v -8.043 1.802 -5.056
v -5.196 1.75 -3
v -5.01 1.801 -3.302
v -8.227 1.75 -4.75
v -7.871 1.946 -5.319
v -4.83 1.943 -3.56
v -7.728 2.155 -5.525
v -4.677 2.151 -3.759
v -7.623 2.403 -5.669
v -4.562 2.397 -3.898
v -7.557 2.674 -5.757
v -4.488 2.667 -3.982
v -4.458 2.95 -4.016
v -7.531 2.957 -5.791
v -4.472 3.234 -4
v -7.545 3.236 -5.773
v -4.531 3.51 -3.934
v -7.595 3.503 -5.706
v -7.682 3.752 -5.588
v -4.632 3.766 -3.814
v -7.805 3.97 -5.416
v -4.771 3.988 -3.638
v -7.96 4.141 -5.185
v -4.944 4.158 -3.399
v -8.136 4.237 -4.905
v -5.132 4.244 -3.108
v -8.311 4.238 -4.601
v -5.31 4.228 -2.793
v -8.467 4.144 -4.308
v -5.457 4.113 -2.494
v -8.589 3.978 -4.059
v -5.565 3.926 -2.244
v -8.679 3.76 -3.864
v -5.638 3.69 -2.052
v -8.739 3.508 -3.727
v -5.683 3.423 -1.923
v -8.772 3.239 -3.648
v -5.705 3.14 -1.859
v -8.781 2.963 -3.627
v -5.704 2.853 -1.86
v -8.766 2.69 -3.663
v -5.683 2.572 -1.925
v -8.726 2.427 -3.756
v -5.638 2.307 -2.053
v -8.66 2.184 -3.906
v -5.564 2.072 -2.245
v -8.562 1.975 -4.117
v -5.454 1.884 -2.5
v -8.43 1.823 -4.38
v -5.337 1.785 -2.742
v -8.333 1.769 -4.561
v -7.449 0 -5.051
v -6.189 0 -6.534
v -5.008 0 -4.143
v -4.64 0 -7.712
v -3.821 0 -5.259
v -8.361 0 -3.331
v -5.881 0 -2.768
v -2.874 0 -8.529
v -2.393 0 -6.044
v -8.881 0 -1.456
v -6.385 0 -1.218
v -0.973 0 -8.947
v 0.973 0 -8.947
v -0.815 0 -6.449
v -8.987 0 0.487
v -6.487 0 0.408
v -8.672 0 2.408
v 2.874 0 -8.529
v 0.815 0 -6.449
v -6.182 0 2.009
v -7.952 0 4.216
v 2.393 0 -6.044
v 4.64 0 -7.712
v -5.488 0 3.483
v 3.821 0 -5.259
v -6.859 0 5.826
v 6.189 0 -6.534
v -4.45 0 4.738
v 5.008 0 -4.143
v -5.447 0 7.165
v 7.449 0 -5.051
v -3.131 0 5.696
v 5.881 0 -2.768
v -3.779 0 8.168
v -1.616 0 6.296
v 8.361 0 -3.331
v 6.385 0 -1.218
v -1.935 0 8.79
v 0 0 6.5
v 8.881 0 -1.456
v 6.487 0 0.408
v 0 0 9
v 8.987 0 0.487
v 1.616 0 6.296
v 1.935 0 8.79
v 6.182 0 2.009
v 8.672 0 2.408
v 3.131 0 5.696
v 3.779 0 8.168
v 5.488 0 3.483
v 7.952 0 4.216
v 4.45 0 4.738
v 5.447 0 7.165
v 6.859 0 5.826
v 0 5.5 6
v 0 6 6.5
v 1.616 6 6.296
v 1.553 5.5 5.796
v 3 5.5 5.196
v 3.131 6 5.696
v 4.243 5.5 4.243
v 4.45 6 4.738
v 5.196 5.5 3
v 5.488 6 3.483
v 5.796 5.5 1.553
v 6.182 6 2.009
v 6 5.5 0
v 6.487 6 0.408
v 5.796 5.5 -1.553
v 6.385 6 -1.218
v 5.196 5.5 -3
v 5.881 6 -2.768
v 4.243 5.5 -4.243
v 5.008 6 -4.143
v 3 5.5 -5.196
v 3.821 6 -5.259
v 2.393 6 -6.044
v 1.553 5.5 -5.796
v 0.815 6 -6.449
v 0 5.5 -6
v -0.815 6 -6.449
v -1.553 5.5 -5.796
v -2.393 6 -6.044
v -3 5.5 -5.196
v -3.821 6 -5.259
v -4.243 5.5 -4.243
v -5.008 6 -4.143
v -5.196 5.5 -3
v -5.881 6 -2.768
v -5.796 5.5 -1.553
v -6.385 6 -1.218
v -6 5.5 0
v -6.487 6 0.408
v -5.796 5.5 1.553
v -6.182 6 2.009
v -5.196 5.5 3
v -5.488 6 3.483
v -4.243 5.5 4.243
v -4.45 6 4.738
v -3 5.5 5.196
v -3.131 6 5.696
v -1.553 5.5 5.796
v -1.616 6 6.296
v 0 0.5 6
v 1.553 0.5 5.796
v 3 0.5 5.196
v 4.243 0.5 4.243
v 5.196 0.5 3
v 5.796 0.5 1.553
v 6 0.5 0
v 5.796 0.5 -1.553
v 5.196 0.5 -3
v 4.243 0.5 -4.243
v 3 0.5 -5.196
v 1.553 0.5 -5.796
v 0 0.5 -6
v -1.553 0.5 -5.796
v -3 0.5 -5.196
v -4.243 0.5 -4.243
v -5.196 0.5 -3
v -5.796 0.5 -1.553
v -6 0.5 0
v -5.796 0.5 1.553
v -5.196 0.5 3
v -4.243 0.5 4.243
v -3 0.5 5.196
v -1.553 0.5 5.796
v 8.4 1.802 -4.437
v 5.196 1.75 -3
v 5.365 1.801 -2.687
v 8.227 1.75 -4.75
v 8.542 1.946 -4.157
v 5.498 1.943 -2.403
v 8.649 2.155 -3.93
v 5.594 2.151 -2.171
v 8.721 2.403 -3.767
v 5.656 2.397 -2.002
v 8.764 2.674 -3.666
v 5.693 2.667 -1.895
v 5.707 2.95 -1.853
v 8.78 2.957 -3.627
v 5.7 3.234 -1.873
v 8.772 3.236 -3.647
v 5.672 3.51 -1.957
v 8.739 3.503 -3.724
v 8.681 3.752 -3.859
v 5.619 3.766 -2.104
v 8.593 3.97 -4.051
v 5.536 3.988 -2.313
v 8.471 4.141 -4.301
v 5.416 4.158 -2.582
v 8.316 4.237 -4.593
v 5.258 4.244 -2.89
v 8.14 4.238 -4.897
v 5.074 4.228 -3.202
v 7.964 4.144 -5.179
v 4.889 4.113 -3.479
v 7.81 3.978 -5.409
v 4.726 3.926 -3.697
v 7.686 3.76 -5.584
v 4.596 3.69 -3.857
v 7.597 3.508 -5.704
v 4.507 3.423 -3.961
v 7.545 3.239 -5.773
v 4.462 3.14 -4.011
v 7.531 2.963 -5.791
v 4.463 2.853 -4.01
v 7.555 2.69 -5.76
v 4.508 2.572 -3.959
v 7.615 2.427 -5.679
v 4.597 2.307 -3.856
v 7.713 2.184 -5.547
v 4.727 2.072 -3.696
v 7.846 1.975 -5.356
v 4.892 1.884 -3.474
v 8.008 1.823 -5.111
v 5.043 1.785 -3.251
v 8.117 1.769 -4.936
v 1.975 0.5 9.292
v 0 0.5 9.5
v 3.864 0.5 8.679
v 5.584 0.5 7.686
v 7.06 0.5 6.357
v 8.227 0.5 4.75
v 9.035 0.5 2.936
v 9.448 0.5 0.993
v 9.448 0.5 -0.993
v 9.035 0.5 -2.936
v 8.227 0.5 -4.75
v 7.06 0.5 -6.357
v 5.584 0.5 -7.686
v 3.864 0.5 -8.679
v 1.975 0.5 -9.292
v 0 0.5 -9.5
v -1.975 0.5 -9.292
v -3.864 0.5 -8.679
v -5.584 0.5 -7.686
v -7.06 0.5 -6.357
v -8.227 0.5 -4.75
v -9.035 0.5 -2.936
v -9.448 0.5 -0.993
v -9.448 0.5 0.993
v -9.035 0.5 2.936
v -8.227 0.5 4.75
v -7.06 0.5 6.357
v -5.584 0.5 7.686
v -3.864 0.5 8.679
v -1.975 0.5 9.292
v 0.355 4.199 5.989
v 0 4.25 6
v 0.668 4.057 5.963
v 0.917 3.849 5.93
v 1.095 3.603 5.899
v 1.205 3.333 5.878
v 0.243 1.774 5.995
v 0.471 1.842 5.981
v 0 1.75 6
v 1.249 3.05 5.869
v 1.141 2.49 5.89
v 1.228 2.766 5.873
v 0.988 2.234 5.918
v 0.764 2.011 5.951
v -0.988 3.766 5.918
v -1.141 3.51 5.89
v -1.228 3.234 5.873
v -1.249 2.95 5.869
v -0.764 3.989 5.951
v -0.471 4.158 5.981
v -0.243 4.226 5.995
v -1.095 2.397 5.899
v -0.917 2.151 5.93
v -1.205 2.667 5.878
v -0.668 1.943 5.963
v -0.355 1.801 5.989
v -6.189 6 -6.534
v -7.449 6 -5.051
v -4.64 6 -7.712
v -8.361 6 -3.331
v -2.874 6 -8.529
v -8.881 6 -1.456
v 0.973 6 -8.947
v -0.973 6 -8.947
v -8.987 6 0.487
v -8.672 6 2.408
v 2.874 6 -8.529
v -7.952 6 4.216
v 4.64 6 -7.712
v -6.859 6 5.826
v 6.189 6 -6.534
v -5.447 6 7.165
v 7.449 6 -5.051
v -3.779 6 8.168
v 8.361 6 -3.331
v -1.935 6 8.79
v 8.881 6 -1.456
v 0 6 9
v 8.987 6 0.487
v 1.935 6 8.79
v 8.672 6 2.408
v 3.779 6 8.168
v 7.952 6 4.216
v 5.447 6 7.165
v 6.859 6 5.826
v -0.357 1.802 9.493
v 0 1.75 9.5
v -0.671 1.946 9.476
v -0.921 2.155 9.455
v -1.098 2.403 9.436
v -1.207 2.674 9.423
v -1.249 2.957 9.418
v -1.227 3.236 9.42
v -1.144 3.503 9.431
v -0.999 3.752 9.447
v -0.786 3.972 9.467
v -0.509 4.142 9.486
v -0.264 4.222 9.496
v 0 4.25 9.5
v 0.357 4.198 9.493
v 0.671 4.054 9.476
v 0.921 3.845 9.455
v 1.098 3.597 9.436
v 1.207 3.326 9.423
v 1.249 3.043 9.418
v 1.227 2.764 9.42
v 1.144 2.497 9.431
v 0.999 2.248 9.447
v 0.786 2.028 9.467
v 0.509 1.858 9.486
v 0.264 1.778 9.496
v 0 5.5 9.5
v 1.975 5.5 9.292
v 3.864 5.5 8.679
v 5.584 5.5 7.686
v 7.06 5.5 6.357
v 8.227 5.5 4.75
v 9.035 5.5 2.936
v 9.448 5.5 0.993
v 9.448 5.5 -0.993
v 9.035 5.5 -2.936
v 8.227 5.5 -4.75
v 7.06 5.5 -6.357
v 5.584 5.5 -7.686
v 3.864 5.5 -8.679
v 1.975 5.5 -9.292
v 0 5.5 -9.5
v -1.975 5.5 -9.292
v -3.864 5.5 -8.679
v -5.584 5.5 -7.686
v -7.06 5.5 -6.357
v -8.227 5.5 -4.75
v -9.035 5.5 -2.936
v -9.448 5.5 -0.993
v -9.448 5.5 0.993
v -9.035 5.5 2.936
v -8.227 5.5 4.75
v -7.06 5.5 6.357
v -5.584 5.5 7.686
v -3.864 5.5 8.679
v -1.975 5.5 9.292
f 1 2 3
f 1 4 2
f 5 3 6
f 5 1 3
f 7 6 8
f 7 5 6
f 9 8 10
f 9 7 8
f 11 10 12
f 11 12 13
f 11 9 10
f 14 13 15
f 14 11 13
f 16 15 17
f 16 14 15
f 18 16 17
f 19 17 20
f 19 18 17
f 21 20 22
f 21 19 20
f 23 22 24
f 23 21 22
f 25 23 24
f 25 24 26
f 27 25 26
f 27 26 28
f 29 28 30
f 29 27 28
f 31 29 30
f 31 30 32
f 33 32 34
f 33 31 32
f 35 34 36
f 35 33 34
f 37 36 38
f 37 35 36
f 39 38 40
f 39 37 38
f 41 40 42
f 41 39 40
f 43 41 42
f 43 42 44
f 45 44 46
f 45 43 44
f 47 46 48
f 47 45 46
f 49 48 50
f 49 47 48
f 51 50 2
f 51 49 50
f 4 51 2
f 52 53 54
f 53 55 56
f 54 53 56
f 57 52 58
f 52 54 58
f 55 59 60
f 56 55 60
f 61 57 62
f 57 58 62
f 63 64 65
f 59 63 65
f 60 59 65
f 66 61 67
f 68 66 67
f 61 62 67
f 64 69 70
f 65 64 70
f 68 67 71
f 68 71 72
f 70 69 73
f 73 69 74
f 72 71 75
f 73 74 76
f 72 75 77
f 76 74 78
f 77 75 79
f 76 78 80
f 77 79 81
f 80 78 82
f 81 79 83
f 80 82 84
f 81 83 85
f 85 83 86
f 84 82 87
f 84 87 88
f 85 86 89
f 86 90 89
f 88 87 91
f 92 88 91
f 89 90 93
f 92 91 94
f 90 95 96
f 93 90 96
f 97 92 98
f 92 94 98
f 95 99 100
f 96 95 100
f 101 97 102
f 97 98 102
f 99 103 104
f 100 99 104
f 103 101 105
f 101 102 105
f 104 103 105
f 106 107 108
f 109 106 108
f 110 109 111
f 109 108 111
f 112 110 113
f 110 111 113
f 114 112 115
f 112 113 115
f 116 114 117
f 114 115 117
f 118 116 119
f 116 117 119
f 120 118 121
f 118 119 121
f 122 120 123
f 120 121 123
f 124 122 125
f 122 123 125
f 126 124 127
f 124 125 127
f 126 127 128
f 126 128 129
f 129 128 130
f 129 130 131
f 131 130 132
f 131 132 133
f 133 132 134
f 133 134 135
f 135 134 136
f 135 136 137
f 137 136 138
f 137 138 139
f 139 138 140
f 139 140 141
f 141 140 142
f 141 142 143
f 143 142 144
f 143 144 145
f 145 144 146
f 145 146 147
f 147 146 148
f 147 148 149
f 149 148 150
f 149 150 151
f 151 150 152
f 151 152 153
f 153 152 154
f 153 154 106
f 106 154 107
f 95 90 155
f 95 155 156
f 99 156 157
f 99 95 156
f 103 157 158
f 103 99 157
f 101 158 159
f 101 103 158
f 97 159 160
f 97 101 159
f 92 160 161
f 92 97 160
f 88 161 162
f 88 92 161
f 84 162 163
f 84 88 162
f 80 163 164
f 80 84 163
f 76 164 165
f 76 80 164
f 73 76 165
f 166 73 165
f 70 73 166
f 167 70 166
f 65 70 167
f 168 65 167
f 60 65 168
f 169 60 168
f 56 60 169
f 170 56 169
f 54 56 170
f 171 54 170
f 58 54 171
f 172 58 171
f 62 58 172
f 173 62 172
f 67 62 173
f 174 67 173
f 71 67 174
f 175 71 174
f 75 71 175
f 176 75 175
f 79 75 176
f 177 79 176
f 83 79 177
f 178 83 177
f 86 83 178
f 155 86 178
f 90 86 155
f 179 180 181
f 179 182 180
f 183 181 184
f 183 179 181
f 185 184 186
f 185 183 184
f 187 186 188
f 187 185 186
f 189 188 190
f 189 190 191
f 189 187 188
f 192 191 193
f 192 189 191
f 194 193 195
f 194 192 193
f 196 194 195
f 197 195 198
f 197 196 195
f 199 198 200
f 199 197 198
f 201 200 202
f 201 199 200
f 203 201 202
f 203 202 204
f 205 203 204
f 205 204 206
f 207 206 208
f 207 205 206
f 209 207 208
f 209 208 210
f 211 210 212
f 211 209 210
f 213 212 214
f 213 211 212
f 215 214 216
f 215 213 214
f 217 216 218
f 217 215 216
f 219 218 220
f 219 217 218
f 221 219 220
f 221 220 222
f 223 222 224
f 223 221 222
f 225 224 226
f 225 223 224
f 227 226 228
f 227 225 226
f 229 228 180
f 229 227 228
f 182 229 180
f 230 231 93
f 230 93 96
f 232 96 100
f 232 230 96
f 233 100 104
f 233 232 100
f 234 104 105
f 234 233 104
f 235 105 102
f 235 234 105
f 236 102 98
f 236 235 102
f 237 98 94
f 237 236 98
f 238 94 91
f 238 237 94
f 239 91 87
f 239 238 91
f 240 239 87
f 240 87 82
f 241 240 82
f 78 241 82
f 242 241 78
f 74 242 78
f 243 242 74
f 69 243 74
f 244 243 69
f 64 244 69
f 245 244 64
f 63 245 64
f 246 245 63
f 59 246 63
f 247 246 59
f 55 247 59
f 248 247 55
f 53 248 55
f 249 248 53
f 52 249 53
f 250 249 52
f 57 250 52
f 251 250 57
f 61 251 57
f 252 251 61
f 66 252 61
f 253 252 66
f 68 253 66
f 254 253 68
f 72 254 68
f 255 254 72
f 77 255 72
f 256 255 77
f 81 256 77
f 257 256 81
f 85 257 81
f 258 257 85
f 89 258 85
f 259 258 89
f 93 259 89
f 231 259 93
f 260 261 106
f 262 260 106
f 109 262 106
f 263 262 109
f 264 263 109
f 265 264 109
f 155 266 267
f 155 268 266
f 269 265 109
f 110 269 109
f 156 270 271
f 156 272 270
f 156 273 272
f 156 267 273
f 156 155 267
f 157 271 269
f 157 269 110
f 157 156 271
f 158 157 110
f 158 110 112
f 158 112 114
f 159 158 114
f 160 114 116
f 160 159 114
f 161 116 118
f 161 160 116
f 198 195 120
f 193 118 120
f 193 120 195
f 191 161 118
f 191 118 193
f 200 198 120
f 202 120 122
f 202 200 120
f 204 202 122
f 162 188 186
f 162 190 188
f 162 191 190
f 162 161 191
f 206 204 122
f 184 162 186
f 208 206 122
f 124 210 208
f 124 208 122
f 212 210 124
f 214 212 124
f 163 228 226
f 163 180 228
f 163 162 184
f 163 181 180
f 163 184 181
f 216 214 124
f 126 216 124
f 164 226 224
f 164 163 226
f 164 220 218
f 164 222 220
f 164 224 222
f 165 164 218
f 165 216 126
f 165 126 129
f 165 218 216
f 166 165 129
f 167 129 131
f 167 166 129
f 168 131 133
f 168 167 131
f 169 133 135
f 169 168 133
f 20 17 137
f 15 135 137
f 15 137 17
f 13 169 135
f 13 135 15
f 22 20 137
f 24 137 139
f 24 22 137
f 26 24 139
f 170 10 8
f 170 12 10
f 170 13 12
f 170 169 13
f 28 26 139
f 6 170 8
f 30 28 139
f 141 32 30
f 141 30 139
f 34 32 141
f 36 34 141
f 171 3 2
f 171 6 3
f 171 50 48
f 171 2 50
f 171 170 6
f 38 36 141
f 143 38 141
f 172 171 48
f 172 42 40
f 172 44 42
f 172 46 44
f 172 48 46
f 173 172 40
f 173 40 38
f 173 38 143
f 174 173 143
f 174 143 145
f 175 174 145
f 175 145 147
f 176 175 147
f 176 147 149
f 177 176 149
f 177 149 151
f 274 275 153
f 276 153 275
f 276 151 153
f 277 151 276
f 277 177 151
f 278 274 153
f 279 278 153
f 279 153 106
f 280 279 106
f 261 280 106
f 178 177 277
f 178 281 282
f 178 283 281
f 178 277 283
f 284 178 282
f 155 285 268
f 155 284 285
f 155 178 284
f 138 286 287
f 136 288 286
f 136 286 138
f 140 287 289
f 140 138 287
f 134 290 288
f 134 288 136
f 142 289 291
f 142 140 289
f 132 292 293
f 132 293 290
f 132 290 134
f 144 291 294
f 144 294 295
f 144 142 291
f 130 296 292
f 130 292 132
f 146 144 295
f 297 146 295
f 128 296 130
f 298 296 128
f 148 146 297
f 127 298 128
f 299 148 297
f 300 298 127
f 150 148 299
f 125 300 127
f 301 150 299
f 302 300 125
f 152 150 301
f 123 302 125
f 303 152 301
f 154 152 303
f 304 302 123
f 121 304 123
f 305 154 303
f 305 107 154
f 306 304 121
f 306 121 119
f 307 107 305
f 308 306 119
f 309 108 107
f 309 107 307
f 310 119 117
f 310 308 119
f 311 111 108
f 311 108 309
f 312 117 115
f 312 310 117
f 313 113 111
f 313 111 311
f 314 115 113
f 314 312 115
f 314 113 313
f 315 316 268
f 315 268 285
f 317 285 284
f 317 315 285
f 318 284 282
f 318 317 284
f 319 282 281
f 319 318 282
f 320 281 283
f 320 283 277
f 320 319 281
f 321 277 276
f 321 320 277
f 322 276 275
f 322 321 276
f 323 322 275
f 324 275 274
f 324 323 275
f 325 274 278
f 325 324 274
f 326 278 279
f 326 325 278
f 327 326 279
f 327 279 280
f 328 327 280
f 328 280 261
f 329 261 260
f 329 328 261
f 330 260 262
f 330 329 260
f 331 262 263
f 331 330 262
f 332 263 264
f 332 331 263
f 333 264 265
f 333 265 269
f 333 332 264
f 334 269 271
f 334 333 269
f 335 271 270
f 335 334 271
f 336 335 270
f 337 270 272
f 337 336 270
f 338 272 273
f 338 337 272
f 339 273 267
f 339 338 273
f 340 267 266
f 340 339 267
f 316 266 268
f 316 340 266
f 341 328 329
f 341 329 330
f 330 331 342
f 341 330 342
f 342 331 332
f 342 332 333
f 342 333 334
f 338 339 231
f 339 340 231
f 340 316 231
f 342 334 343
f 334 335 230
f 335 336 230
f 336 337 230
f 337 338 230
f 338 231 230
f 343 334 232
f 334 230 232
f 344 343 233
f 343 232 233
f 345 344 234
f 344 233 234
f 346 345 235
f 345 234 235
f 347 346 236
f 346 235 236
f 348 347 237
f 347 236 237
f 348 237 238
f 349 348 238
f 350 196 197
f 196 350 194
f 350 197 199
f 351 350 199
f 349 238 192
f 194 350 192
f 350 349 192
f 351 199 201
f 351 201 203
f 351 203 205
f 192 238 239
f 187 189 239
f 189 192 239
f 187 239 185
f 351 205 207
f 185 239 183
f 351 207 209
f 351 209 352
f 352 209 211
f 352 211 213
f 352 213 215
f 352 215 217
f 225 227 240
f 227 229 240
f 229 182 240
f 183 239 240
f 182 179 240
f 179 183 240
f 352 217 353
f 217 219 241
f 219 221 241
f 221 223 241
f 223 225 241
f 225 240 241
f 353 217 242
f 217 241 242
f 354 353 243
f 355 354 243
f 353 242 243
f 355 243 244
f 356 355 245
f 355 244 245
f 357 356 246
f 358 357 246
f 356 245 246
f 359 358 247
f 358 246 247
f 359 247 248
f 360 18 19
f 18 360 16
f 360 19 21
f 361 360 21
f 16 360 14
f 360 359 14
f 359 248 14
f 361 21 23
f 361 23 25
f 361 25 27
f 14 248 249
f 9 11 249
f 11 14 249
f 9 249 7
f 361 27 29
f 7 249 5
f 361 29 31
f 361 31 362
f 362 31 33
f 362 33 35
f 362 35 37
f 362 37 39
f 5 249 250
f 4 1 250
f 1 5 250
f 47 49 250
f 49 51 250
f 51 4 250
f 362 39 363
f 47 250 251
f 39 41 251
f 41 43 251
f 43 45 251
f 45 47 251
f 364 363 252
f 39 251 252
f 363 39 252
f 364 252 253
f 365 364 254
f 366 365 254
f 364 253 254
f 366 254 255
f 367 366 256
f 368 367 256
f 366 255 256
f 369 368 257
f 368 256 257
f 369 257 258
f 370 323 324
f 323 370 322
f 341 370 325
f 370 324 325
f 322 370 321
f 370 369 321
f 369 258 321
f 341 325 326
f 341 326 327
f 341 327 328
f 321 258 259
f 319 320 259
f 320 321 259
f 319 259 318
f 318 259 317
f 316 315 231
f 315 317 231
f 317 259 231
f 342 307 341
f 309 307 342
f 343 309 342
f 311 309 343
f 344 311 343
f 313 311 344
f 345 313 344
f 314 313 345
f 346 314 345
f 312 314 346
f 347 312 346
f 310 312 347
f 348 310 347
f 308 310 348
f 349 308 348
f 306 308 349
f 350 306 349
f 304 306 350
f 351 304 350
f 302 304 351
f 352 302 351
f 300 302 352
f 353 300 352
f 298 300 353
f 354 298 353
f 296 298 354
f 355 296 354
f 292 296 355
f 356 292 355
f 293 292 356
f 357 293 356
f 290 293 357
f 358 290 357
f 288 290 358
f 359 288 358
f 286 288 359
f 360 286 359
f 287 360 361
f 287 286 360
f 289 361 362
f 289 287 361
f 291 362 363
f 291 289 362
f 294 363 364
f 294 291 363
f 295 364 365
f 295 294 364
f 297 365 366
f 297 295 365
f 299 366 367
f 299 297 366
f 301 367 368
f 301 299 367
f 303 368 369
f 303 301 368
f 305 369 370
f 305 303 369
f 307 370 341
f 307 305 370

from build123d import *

# Parameters (mm, degrees)
CROQUIS1_R              = 9.5
CROQUIS1_R_2            = 6
SALIENTE_EXTRUIR1_DEPTH = 6
MATRIZC1_COUNT          = 3
CHAFL_N1_SIZE           = 0.5
CHAFL_N2_SIZE           = 0.5


with BuildPart() as part:
    # Croquis1 → Saliente-Extruir1 (new body)
    with BuildSketch(Plane(origin=(0, 0, 0), x_dir=(1, 0, 0), z_dir=(0, 1, 0))):
        with Locations(Location((0, 0, 0), (0, 0, 270))):
            Circle(CROQUIS1_R)
        with Locations(Location((0, 0, 0), (0, 0, 270))):
            Circle(CROQUIS1_R_2, mode=Mode.SUBTRACT)
    extrude(amount=SALIENTE_EXTRUIR1_DEPTH)

    # Croquis3 → Taladro roscado M31 (revolve, cut)
    with BuildSketch(Plane(origin=(0, 3, 9.5), x_dir=(0, -1, 0), z_dir=(1, 0, 0))):
        Polygon((0, 0), (0, 9.251075774), (1.25, 8.5), (1.25, 0), align=None)
    taladro_roscado_m31 = revolve(axis=Axis((0, 3, 15.85), (0, 0, -1)), mode=Mode.SUBTRACT)

    # MatrizC1: Taladro roscado M31 ×3 about axis
    matrizc1_axis = Axis((0, 0, 0), (0, 1, 0))
    for i in range(1, MATRIZC1_COUNT):
        add(taladro_roscado_m31.rotate(matrizc1_axis, i * 360 / MATRIZC1_COUNT), mode=Mode.SUBTRACT)

    # Chaflán1
    chafl_n1_edges = [part.edges().sort_by_distance(p)[0] for p in [
        (0, 0, -6),
        (0, 6, -6),
    ]]
    chamfer(chafl_n1_edges, length=CHAFL_N1_SIZE)

    # Chaflán2
    chafl_n2_edges = [part.edges().sort_by_distance(p)[0] for p in [
        (0, 0, -9.5),
        (0, 6, -9.5),
    ]]
    chamfer(chafl_n2_edges, length=CHAFL_N2_SIZE)


solid = part.part
